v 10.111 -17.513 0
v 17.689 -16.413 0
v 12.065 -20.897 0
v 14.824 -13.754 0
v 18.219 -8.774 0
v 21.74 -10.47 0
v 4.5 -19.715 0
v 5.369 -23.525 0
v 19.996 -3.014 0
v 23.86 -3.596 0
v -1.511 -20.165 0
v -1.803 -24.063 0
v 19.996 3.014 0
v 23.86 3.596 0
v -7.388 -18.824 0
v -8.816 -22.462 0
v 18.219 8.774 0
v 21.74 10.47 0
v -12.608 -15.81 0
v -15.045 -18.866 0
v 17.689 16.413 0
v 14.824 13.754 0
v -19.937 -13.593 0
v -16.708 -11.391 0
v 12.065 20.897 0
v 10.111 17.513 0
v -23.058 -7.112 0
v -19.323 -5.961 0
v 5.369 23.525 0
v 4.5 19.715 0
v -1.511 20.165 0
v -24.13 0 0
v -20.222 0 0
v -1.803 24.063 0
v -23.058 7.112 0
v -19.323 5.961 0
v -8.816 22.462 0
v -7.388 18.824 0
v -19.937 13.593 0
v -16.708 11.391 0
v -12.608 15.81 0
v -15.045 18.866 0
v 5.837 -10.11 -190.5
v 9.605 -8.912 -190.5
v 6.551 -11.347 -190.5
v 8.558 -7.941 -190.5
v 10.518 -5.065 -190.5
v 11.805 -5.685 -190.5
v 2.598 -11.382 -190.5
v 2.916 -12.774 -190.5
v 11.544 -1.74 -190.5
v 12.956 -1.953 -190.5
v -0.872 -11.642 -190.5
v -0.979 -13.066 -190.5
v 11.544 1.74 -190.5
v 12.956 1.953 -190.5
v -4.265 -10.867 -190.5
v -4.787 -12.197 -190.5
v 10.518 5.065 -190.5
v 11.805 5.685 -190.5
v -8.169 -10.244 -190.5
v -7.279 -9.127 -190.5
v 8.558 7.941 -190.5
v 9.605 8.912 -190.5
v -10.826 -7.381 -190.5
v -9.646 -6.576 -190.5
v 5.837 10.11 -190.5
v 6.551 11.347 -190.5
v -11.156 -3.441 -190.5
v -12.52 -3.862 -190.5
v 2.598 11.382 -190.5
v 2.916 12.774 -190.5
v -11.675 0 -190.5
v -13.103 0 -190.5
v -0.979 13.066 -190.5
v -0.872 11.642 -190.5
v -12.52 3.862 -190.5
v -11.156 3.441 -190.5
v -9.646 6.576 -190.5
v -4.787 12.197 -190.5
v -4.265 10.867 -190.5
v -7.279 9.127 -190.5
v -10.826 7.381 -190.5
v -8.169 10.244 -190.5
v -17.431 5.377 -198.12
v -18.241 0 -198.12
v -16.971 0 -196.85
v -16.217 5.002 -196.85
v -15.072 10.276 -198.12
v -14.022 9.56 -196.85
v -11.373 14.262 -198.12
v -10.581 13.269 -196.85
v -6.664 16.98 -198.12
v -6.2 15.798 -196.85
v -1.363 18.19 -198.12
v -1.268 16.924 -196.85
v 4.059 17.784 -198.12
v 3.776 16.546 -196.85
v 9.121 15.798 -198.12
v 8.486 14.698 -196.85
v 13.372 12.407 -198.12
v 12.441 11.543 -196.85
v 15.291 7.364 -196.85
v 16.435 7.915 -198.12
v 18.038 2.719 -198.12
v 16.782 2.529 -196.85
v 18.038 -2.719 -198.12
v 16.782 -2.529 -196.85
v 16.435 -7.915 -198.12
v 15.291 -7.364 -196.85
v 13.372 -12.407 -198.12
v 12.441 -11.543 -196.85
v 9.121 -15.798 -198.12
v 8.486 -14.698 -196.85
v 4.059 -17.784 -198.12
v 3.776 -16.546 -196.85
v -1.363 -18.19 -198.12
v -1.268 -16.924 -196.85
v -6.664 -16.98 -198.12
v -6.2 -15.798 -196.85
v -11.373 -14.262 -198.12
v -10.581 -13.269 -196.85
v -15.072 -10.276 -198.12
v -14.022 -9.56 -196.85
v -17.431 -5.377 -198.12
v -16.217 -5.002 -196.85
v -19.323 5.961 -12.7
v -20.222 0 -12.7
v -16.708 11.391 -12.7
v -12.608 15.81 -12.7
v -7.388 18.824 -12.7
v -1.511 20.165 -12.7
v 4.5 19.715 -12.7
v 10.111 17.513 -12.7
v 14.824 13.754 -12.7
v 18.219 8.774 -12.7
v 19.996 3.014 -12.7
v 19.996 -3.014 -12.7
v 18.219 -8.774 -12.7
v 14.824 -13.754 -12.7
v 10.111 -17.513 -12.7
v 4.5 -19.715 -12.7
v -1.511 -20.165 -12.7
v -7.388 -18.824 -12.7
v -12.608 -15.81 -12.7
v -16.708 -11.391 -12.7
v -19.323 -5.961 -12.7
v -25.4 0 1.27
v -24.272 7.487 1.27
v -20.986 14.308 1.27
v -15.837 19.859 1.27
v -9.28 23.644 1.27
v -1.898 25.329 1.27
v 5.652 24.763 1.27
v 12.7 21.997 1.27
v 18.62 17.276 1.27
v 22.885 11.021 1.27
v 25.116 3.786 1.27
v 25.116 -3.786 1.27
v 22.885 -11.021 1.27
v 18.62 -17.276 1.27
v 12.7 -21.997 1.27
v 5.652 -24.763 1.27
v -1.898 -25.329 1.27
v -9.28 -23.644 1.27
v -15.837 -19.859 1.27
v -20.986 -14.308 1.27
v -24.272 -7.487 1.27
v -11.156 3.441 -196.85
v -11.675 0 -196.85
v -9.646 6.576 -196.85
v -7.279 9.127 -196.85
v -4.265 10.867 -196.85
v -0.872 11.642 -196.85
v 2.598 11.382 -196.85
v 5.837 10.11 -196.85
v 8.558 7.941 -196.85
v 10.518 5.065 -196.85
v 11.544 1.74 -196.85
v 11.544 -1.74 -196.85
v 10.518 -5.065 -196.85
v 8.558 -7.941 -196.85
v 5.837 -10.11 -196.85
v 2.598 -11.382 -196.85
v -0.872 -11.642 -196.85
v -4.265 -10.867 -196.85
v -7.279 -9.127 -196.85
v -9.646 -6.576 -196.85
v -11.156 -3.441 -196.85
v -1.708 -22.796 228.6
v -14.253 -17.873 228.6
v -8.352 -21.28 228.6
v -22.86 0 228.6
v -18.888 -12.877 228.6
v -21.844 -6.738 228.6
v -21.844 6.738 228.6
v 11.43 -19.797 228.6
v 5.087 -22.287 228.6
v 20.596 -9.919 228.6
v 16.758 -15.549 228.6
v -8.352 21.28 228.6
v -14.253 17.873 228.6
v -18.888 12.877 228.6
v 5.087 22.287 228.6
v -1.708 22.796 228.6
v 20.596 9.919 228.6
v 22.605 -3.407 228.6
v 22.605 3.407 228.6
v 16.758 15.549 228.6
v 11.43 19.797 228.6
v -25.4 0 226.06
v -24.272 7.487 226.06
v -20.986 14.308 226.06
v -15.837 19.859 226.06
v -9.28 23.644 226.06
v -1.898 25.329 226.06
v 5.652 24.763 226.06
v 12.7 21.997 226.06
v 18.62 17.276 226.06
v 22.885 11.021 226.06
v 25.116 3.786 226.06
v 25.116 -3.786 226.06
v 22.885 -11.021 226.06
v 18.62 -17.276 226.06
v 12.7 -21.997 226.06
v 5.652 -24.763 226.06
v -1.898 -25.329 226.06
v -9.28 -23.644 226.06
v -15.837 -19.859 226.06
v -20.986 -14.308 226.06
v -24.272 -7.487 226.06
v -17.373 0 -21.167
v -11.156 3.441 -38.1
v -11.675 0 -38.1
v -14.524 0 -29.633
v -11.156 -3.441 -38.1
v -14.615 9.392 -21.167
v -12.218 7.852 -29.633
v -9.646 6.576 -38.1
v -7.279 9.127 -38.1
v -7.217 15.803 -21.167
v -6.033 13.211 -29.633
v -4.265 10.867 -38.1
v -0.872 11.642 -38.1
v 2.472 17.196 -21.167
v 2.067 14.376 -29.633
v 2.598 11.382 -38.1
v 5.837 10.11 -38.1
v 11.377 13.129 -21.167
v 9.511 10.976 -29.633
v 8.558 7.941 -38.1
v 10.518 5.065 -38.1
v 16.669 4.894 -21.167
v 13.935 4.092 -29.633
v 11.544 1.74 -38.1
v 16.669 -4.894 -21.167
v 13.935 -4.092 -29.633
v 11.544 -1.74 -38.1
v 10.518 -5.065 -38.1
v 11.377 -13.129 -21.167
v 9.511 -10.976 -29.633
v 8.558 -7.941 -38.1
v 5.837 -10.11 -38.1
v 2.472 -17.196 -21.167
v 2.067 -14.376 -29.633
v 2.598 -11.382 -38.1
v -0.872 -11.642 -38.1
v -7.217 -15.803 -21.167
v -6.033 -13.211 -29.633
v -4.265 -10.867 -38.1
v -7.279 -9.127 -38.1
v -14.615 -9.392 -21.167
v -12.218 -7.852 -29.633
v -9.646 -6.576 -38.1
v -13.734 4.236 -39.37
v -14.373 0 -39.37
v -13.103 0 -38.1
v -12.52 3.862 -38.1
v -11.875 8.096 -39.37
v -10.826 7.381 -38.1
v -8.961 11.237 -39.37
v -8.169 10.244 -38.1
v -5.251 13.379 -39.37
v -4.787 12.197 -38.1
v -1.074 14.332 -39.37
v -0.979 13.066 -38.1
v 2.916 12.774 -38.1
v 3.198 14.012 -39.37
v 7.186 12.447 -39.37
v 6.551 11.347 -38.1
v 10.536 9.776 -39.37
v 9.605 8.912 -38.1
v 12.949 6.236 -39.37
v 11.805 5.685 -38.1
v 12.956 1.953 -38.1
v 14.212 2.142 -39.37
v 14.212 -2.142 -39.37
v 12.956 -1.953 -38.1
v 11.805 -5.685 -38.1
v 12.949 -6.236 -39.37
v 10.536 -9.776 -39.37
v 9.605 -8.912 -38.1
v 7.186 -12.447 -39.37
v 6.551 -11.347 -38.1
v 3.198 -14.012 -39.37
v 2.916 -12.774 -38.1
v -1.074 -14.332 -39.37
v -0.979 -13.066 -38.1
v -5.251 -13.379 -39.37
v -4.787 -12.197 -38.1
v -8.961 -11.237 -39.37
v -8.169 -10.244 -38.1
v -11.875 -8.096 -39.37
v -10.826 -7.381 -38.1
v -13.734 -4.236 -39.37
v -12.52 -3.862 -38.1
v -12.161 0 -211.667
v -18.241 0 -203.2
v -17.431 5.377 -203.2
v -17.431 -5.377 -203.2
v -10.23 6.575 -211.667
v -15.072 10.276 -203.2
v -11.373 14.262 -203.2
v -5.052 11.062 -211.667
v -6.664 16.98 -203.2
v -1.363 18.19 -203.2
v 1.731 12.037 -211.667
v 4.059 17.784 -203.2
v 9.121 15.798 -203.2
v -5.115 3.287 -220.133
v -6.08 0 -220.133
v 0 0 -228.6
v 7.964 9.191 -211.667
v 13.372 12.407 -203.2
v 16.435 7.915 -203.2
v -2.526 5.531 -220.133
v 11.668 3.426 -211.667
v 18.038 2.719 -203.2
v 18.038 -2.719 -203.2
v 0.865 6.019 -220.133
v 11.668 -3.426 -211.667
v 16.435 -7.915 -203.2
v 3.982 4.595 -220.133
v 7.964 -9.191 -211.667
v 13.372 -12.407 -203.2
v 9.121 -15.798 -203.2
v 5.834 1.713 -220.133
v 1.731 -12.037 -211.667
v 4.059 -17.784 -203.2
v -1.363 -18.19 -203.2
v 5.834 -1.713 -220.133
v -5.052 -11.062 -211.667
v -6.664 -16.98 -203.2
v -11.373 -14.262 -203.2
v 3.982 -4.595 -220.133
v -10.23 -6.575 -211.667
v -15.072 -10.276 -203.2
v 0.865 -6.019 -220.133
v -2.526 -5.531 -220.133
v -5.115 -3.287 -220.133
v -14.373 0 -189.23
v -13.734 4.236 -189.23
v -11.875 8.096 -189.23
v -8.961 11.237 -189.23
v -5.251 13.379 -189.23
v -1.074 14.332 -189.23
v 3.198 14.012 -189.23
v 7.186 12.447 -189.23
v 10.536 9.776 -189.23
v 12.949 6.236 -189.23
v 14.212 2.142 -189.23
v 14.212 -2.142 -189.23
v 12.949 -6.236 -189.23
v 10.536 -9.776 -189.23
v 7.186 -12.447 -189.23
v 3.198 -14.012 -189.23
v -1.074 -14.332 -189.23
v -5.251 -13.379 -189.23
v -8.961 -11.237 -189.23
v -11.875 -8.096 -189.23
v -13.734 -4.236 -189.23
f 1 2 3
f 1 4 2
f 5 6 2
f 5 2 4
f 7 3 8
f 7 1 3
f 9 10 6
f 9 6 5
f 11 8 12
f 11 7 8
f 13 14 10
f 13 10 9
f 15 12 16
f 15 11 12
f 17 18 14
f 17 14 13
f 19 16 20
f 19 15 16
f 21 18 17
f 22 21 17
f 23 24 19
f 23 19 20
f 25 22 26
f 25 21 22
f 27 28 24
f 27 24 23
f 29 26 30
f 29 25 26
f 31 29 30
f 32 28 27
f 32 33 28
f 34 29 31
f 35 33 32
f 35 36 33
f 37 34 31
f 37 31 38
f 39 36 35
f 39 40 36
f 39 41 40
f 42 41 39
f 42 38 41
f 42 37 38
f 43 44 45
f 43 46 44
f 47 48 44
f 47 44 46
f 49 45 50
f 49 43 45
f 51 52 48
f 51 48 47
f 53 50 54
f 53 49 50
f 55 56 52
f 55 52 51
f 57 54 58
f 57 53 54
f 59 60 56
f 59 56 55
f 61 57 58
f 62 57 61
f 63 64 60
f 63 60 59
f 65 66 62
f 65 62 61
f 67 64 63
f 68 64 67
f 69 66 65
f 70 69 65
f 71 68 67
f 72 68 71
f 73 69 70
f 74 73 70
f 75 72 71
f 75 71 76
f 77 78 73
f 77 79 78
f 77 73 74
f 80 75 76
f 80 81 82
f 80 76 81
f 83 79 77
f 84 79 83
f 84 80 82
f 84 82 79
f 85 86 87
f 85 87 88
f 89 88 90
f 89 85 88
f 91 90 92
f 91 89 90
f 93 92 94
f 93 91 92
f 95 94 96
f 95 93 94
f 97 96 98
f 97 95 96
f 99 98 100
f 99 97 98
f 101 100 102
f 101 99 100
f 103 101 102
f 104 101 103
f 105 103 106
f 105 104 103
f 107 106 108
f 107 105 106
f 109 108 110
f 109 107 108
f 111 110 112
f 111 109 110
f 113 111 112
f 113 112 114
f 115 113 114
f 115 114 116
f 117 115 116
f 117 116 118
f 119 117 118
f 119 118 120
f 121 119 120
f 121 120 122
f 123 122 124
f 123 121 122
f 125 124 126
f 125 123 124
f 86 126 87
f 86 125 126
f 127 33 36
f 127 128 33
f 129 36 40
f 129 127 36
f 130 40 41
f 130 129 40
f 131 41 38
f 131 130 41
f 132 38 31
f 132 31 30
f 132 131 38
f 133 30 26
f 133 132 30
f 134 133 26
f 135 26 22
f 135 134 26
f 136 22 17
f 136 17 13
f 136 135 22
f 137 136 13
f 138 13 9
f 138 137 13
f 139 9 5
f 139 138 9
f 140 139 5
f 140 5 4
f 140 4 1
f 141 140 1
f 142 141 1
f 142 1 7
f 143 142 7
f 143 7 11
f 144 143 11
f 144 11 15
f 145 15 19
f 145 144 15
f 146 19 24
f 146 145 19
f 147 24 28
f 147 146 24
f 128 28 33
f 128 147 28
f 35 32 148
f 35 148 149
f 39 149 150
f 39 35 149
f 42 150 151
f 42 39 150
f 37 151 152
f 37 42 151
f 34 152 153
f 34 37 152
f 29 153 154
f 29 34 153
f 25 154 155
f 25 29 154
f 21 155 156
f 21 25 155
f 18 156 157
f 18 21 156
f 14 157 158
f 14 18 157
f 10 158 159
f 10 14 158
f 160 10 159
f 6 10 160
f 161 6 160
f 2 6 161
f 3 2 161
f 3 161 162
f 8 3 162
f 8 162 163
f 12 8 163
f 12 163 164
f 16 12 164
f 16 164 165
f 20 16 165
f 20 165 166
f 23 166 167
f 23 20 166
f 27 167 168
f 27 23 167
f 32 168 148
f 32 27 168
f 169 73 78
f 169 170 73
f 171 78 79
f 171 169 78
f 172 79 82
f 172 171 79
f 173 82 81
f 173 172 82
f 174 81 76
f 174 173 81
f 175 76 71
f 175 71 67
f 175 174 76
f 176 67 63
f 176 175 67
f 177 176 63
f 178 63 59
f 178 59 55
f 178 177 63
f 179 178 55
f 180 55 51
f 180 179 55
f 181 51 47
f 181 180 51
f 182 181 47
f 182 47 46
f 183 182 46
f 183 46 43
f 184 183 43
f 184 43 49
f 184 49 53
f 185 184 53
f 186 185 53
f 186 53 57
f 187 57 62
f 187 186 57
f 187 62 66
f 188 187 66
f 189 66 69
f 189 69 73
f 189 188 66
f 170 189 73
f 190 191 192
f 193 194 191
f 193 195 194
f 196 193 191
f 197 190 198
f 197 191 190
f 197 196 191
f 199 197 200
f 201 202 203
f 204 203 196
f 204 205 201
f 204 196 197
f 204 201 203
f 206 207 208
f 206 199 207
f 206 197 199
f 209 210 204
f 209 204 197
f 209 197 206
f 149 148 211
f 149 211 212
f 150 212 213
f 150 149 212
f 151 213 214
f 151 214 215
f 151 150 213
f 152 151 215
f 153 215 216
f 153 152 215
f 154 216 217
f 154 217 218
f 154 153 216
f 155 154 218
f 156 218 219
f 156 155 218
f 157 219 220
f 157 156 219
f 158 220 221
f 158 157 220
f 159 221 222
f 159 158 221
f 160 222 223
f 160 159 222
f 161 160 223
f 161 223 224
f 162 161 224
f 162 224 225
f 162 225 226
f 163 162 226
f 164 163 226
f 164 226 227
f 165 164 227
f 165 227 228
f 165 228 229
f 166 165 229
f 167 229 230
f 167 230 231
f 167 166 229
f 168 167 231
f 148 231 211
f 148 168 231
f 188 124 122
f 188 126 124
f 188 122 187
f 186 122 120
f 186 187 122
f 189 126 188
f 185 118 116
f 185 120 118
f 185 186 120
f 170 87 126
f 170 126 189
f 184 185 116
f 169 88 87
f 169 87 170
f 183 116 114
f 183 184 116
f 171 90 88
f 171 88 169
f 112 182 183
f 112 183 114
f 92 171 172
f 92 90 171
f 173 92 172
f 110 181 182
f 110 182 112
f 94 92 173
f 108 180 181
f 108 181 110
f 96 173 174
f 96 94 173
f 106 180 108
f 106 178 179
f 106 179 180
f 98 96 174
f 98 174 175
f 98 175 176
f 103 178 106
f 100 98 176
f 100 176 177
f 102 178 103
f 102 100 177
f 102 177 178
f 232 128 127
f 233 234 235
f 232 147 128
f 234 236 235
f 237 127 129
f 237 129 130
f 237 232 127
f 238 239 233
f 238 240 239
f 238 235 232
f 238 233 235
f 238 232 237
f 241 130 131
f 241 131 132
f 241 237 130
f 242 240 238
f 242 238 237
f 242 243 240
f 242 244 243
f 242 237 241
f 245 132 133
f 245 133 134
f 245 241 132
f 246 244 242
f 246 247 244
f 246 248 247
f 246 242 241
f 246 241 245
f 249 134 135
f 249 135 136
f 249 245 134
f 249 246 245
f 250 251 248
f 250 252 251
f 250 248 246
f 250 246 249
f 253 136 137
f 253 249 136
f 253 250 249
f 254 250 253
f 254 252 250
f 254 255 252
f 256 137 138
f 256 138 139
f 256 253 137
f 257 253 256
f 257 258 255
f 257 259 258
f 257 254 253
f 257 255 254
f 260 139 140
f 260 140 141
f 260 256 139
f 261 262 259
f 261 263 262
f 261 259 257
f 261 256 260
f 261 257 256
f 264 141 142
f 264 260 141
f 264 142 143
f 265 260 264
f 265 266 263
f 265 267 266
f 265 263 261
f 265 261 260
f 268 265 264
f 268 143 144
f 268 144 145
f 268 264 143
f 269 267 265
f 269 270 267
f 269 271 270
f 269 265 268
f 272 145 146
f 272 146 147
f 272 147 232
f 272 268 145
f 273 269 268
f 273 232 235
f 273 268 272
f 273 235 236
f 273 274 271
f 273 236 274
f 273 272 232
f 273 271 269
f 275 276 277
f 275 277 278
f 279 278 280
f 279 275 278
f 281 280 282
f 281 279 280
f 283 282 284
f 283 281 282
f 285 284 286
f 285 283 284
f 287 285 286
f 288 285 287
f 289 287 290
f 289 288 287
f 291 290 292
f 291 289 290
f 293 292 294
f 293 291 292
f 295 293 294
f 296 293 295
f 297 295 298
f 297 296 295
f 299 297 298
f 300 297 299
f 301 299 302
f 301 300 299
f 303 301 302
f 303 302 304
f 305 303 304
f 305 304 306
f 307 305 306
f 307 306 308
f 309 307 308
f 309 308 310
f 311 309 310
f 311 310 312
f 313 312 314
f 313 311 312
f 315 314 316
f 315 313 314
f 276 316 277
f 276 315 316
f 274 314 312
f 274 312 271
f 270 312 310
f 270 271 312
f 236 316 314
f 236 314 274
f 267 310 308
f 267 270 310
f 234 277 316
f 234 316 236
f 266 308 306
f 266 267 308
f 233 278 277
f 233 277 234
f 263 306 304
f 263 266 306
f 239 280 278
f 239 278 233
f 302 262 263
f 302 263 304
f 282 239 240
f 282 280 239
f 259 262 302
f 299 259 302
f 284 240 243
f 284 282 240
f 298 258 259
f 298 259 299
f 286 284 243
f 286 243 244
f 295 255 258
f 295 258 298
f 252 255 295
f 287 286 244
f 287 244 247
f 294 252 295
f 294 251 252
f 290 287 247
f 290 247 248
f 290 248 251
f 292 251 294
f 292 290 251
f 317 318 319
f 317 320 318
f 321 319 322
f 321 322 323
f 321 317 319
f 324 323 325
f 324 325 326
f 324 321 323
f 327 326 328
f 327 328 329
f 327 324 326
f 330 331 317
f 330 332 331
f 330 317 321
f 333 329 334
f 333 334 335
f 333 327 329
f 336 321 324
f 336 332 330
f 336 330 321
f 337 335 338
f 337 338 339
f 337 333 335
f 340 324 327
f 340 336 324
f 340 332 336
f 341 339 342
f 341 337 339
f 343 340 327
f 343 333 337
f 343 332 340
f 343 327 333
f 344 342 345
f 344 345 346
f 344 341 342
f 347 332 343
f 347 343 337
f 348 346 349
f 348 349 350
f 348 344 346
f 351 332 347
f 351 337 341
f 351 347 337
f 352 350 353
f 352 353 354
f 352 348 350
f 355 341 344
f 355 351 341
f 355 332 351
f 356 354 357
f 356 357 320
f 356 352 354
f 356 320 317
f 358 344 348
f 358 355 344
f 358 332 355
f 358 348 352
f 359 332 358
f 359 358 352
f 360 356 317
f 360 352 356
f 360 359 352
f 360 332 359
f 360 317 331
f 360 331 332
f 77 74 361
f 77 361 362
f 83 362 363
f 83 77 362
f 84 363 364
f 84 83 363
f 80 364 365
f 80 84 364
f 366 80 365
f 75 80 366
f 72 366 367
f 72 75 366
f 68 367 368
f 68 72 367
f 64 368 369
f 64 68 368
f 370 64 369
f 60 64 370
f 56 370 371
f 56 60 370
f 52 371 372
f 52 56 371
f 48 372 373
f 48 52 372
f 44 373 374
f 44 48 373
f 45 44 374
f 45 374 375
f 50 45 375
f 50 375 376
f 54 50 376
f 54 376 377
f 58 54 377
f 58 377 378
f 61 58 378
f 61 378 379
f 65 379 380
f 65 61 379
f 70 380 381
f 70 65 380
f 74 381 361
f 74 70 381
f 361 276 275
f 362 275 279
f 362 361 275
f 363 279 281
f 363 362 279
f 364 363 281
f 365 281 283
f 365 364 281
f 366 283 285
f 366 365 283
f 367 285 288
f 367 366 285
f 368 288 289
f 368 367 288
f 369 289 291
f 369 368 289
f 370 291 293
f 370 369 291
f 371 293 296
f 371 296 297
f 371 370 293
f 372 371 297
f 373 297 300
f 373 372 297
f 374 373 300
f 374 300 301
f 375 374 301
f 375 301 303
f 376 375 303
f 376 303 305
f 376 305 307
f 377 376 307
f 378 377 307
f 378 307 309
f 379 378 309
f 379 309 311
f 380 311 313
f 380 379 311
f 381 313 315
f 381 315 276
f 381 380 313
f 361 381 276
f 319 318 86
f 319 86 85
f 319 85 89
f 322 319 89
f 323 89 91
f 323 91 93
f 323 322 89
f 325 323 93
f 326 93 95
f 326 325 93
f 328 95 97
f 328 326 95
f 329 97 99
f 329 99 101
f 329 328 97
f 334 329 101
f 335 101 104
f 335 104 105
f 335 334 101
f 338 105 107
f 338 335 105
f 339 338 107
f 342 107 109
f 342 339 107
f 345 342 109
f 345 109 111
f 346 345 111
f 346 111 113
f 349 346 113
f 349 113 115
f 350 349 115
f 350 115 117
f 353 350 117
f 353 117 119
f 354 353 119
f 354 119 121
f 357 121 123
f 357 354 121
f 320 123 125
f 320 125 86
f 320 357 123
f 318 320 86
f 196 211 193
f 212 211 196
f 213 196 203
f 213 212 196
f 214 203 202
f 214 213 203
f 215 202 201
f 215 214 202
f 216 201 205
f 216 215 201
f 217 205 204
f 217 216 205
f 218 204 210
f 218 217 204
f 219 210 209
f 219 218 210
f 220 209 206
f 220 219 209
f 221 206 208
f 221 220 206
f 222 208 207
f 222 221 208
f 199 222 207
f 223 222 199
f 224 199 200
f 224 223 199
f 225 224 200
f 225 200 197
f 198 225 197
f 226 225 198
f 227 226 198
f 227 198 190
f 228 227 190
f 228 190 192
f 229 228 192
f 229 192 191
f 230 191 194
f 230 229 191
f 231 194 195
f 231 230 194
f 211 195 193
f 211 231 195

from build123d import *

# Parameters (mm, degrees)
F2_SIZE = 2.54
F3_SIZE = 1.27


with BuildPart() as f1:
    # F0 (on Front) → F1 (revolve)
    with BuildSketch(Plane.XZ):
        Polygon((0, -228.6), (0, 228.6), (-25.4, 228.6), (-25.4, 0), (-20.2219, 0), (-20.2219, -12.7), (-11.674506, -38.1), (-14.372522, -38.1), (-14.372522, -190.5), (-11.674506, -190.5), (-11.674506, -196.85), (-18.241385, -196.85), (-18.241385, -203.2), align=None)
    revolve(axis=Axis((0, 0, 0), (0, 0, -1)))

    # F2
    f2_edges = [f1.edges().sort_by_distance(p)[0] for p in [
        (25.4, 0, 228.6),
    ]]
    chamfer(f2_edges, length=F2_SIZE)

    # F3
    f3_edges = [f1.edges().sort_by_distance(p)[0] for p in [
        (25.4, 0, 0),
        (14.372522, 0, -38.1),
        (18.241385, 0, -196.85),
        (14.372522, 0, -190.5),
    ]]
    chamfer(f3_edges, length=F3_SIZE)


solid = f1.part
